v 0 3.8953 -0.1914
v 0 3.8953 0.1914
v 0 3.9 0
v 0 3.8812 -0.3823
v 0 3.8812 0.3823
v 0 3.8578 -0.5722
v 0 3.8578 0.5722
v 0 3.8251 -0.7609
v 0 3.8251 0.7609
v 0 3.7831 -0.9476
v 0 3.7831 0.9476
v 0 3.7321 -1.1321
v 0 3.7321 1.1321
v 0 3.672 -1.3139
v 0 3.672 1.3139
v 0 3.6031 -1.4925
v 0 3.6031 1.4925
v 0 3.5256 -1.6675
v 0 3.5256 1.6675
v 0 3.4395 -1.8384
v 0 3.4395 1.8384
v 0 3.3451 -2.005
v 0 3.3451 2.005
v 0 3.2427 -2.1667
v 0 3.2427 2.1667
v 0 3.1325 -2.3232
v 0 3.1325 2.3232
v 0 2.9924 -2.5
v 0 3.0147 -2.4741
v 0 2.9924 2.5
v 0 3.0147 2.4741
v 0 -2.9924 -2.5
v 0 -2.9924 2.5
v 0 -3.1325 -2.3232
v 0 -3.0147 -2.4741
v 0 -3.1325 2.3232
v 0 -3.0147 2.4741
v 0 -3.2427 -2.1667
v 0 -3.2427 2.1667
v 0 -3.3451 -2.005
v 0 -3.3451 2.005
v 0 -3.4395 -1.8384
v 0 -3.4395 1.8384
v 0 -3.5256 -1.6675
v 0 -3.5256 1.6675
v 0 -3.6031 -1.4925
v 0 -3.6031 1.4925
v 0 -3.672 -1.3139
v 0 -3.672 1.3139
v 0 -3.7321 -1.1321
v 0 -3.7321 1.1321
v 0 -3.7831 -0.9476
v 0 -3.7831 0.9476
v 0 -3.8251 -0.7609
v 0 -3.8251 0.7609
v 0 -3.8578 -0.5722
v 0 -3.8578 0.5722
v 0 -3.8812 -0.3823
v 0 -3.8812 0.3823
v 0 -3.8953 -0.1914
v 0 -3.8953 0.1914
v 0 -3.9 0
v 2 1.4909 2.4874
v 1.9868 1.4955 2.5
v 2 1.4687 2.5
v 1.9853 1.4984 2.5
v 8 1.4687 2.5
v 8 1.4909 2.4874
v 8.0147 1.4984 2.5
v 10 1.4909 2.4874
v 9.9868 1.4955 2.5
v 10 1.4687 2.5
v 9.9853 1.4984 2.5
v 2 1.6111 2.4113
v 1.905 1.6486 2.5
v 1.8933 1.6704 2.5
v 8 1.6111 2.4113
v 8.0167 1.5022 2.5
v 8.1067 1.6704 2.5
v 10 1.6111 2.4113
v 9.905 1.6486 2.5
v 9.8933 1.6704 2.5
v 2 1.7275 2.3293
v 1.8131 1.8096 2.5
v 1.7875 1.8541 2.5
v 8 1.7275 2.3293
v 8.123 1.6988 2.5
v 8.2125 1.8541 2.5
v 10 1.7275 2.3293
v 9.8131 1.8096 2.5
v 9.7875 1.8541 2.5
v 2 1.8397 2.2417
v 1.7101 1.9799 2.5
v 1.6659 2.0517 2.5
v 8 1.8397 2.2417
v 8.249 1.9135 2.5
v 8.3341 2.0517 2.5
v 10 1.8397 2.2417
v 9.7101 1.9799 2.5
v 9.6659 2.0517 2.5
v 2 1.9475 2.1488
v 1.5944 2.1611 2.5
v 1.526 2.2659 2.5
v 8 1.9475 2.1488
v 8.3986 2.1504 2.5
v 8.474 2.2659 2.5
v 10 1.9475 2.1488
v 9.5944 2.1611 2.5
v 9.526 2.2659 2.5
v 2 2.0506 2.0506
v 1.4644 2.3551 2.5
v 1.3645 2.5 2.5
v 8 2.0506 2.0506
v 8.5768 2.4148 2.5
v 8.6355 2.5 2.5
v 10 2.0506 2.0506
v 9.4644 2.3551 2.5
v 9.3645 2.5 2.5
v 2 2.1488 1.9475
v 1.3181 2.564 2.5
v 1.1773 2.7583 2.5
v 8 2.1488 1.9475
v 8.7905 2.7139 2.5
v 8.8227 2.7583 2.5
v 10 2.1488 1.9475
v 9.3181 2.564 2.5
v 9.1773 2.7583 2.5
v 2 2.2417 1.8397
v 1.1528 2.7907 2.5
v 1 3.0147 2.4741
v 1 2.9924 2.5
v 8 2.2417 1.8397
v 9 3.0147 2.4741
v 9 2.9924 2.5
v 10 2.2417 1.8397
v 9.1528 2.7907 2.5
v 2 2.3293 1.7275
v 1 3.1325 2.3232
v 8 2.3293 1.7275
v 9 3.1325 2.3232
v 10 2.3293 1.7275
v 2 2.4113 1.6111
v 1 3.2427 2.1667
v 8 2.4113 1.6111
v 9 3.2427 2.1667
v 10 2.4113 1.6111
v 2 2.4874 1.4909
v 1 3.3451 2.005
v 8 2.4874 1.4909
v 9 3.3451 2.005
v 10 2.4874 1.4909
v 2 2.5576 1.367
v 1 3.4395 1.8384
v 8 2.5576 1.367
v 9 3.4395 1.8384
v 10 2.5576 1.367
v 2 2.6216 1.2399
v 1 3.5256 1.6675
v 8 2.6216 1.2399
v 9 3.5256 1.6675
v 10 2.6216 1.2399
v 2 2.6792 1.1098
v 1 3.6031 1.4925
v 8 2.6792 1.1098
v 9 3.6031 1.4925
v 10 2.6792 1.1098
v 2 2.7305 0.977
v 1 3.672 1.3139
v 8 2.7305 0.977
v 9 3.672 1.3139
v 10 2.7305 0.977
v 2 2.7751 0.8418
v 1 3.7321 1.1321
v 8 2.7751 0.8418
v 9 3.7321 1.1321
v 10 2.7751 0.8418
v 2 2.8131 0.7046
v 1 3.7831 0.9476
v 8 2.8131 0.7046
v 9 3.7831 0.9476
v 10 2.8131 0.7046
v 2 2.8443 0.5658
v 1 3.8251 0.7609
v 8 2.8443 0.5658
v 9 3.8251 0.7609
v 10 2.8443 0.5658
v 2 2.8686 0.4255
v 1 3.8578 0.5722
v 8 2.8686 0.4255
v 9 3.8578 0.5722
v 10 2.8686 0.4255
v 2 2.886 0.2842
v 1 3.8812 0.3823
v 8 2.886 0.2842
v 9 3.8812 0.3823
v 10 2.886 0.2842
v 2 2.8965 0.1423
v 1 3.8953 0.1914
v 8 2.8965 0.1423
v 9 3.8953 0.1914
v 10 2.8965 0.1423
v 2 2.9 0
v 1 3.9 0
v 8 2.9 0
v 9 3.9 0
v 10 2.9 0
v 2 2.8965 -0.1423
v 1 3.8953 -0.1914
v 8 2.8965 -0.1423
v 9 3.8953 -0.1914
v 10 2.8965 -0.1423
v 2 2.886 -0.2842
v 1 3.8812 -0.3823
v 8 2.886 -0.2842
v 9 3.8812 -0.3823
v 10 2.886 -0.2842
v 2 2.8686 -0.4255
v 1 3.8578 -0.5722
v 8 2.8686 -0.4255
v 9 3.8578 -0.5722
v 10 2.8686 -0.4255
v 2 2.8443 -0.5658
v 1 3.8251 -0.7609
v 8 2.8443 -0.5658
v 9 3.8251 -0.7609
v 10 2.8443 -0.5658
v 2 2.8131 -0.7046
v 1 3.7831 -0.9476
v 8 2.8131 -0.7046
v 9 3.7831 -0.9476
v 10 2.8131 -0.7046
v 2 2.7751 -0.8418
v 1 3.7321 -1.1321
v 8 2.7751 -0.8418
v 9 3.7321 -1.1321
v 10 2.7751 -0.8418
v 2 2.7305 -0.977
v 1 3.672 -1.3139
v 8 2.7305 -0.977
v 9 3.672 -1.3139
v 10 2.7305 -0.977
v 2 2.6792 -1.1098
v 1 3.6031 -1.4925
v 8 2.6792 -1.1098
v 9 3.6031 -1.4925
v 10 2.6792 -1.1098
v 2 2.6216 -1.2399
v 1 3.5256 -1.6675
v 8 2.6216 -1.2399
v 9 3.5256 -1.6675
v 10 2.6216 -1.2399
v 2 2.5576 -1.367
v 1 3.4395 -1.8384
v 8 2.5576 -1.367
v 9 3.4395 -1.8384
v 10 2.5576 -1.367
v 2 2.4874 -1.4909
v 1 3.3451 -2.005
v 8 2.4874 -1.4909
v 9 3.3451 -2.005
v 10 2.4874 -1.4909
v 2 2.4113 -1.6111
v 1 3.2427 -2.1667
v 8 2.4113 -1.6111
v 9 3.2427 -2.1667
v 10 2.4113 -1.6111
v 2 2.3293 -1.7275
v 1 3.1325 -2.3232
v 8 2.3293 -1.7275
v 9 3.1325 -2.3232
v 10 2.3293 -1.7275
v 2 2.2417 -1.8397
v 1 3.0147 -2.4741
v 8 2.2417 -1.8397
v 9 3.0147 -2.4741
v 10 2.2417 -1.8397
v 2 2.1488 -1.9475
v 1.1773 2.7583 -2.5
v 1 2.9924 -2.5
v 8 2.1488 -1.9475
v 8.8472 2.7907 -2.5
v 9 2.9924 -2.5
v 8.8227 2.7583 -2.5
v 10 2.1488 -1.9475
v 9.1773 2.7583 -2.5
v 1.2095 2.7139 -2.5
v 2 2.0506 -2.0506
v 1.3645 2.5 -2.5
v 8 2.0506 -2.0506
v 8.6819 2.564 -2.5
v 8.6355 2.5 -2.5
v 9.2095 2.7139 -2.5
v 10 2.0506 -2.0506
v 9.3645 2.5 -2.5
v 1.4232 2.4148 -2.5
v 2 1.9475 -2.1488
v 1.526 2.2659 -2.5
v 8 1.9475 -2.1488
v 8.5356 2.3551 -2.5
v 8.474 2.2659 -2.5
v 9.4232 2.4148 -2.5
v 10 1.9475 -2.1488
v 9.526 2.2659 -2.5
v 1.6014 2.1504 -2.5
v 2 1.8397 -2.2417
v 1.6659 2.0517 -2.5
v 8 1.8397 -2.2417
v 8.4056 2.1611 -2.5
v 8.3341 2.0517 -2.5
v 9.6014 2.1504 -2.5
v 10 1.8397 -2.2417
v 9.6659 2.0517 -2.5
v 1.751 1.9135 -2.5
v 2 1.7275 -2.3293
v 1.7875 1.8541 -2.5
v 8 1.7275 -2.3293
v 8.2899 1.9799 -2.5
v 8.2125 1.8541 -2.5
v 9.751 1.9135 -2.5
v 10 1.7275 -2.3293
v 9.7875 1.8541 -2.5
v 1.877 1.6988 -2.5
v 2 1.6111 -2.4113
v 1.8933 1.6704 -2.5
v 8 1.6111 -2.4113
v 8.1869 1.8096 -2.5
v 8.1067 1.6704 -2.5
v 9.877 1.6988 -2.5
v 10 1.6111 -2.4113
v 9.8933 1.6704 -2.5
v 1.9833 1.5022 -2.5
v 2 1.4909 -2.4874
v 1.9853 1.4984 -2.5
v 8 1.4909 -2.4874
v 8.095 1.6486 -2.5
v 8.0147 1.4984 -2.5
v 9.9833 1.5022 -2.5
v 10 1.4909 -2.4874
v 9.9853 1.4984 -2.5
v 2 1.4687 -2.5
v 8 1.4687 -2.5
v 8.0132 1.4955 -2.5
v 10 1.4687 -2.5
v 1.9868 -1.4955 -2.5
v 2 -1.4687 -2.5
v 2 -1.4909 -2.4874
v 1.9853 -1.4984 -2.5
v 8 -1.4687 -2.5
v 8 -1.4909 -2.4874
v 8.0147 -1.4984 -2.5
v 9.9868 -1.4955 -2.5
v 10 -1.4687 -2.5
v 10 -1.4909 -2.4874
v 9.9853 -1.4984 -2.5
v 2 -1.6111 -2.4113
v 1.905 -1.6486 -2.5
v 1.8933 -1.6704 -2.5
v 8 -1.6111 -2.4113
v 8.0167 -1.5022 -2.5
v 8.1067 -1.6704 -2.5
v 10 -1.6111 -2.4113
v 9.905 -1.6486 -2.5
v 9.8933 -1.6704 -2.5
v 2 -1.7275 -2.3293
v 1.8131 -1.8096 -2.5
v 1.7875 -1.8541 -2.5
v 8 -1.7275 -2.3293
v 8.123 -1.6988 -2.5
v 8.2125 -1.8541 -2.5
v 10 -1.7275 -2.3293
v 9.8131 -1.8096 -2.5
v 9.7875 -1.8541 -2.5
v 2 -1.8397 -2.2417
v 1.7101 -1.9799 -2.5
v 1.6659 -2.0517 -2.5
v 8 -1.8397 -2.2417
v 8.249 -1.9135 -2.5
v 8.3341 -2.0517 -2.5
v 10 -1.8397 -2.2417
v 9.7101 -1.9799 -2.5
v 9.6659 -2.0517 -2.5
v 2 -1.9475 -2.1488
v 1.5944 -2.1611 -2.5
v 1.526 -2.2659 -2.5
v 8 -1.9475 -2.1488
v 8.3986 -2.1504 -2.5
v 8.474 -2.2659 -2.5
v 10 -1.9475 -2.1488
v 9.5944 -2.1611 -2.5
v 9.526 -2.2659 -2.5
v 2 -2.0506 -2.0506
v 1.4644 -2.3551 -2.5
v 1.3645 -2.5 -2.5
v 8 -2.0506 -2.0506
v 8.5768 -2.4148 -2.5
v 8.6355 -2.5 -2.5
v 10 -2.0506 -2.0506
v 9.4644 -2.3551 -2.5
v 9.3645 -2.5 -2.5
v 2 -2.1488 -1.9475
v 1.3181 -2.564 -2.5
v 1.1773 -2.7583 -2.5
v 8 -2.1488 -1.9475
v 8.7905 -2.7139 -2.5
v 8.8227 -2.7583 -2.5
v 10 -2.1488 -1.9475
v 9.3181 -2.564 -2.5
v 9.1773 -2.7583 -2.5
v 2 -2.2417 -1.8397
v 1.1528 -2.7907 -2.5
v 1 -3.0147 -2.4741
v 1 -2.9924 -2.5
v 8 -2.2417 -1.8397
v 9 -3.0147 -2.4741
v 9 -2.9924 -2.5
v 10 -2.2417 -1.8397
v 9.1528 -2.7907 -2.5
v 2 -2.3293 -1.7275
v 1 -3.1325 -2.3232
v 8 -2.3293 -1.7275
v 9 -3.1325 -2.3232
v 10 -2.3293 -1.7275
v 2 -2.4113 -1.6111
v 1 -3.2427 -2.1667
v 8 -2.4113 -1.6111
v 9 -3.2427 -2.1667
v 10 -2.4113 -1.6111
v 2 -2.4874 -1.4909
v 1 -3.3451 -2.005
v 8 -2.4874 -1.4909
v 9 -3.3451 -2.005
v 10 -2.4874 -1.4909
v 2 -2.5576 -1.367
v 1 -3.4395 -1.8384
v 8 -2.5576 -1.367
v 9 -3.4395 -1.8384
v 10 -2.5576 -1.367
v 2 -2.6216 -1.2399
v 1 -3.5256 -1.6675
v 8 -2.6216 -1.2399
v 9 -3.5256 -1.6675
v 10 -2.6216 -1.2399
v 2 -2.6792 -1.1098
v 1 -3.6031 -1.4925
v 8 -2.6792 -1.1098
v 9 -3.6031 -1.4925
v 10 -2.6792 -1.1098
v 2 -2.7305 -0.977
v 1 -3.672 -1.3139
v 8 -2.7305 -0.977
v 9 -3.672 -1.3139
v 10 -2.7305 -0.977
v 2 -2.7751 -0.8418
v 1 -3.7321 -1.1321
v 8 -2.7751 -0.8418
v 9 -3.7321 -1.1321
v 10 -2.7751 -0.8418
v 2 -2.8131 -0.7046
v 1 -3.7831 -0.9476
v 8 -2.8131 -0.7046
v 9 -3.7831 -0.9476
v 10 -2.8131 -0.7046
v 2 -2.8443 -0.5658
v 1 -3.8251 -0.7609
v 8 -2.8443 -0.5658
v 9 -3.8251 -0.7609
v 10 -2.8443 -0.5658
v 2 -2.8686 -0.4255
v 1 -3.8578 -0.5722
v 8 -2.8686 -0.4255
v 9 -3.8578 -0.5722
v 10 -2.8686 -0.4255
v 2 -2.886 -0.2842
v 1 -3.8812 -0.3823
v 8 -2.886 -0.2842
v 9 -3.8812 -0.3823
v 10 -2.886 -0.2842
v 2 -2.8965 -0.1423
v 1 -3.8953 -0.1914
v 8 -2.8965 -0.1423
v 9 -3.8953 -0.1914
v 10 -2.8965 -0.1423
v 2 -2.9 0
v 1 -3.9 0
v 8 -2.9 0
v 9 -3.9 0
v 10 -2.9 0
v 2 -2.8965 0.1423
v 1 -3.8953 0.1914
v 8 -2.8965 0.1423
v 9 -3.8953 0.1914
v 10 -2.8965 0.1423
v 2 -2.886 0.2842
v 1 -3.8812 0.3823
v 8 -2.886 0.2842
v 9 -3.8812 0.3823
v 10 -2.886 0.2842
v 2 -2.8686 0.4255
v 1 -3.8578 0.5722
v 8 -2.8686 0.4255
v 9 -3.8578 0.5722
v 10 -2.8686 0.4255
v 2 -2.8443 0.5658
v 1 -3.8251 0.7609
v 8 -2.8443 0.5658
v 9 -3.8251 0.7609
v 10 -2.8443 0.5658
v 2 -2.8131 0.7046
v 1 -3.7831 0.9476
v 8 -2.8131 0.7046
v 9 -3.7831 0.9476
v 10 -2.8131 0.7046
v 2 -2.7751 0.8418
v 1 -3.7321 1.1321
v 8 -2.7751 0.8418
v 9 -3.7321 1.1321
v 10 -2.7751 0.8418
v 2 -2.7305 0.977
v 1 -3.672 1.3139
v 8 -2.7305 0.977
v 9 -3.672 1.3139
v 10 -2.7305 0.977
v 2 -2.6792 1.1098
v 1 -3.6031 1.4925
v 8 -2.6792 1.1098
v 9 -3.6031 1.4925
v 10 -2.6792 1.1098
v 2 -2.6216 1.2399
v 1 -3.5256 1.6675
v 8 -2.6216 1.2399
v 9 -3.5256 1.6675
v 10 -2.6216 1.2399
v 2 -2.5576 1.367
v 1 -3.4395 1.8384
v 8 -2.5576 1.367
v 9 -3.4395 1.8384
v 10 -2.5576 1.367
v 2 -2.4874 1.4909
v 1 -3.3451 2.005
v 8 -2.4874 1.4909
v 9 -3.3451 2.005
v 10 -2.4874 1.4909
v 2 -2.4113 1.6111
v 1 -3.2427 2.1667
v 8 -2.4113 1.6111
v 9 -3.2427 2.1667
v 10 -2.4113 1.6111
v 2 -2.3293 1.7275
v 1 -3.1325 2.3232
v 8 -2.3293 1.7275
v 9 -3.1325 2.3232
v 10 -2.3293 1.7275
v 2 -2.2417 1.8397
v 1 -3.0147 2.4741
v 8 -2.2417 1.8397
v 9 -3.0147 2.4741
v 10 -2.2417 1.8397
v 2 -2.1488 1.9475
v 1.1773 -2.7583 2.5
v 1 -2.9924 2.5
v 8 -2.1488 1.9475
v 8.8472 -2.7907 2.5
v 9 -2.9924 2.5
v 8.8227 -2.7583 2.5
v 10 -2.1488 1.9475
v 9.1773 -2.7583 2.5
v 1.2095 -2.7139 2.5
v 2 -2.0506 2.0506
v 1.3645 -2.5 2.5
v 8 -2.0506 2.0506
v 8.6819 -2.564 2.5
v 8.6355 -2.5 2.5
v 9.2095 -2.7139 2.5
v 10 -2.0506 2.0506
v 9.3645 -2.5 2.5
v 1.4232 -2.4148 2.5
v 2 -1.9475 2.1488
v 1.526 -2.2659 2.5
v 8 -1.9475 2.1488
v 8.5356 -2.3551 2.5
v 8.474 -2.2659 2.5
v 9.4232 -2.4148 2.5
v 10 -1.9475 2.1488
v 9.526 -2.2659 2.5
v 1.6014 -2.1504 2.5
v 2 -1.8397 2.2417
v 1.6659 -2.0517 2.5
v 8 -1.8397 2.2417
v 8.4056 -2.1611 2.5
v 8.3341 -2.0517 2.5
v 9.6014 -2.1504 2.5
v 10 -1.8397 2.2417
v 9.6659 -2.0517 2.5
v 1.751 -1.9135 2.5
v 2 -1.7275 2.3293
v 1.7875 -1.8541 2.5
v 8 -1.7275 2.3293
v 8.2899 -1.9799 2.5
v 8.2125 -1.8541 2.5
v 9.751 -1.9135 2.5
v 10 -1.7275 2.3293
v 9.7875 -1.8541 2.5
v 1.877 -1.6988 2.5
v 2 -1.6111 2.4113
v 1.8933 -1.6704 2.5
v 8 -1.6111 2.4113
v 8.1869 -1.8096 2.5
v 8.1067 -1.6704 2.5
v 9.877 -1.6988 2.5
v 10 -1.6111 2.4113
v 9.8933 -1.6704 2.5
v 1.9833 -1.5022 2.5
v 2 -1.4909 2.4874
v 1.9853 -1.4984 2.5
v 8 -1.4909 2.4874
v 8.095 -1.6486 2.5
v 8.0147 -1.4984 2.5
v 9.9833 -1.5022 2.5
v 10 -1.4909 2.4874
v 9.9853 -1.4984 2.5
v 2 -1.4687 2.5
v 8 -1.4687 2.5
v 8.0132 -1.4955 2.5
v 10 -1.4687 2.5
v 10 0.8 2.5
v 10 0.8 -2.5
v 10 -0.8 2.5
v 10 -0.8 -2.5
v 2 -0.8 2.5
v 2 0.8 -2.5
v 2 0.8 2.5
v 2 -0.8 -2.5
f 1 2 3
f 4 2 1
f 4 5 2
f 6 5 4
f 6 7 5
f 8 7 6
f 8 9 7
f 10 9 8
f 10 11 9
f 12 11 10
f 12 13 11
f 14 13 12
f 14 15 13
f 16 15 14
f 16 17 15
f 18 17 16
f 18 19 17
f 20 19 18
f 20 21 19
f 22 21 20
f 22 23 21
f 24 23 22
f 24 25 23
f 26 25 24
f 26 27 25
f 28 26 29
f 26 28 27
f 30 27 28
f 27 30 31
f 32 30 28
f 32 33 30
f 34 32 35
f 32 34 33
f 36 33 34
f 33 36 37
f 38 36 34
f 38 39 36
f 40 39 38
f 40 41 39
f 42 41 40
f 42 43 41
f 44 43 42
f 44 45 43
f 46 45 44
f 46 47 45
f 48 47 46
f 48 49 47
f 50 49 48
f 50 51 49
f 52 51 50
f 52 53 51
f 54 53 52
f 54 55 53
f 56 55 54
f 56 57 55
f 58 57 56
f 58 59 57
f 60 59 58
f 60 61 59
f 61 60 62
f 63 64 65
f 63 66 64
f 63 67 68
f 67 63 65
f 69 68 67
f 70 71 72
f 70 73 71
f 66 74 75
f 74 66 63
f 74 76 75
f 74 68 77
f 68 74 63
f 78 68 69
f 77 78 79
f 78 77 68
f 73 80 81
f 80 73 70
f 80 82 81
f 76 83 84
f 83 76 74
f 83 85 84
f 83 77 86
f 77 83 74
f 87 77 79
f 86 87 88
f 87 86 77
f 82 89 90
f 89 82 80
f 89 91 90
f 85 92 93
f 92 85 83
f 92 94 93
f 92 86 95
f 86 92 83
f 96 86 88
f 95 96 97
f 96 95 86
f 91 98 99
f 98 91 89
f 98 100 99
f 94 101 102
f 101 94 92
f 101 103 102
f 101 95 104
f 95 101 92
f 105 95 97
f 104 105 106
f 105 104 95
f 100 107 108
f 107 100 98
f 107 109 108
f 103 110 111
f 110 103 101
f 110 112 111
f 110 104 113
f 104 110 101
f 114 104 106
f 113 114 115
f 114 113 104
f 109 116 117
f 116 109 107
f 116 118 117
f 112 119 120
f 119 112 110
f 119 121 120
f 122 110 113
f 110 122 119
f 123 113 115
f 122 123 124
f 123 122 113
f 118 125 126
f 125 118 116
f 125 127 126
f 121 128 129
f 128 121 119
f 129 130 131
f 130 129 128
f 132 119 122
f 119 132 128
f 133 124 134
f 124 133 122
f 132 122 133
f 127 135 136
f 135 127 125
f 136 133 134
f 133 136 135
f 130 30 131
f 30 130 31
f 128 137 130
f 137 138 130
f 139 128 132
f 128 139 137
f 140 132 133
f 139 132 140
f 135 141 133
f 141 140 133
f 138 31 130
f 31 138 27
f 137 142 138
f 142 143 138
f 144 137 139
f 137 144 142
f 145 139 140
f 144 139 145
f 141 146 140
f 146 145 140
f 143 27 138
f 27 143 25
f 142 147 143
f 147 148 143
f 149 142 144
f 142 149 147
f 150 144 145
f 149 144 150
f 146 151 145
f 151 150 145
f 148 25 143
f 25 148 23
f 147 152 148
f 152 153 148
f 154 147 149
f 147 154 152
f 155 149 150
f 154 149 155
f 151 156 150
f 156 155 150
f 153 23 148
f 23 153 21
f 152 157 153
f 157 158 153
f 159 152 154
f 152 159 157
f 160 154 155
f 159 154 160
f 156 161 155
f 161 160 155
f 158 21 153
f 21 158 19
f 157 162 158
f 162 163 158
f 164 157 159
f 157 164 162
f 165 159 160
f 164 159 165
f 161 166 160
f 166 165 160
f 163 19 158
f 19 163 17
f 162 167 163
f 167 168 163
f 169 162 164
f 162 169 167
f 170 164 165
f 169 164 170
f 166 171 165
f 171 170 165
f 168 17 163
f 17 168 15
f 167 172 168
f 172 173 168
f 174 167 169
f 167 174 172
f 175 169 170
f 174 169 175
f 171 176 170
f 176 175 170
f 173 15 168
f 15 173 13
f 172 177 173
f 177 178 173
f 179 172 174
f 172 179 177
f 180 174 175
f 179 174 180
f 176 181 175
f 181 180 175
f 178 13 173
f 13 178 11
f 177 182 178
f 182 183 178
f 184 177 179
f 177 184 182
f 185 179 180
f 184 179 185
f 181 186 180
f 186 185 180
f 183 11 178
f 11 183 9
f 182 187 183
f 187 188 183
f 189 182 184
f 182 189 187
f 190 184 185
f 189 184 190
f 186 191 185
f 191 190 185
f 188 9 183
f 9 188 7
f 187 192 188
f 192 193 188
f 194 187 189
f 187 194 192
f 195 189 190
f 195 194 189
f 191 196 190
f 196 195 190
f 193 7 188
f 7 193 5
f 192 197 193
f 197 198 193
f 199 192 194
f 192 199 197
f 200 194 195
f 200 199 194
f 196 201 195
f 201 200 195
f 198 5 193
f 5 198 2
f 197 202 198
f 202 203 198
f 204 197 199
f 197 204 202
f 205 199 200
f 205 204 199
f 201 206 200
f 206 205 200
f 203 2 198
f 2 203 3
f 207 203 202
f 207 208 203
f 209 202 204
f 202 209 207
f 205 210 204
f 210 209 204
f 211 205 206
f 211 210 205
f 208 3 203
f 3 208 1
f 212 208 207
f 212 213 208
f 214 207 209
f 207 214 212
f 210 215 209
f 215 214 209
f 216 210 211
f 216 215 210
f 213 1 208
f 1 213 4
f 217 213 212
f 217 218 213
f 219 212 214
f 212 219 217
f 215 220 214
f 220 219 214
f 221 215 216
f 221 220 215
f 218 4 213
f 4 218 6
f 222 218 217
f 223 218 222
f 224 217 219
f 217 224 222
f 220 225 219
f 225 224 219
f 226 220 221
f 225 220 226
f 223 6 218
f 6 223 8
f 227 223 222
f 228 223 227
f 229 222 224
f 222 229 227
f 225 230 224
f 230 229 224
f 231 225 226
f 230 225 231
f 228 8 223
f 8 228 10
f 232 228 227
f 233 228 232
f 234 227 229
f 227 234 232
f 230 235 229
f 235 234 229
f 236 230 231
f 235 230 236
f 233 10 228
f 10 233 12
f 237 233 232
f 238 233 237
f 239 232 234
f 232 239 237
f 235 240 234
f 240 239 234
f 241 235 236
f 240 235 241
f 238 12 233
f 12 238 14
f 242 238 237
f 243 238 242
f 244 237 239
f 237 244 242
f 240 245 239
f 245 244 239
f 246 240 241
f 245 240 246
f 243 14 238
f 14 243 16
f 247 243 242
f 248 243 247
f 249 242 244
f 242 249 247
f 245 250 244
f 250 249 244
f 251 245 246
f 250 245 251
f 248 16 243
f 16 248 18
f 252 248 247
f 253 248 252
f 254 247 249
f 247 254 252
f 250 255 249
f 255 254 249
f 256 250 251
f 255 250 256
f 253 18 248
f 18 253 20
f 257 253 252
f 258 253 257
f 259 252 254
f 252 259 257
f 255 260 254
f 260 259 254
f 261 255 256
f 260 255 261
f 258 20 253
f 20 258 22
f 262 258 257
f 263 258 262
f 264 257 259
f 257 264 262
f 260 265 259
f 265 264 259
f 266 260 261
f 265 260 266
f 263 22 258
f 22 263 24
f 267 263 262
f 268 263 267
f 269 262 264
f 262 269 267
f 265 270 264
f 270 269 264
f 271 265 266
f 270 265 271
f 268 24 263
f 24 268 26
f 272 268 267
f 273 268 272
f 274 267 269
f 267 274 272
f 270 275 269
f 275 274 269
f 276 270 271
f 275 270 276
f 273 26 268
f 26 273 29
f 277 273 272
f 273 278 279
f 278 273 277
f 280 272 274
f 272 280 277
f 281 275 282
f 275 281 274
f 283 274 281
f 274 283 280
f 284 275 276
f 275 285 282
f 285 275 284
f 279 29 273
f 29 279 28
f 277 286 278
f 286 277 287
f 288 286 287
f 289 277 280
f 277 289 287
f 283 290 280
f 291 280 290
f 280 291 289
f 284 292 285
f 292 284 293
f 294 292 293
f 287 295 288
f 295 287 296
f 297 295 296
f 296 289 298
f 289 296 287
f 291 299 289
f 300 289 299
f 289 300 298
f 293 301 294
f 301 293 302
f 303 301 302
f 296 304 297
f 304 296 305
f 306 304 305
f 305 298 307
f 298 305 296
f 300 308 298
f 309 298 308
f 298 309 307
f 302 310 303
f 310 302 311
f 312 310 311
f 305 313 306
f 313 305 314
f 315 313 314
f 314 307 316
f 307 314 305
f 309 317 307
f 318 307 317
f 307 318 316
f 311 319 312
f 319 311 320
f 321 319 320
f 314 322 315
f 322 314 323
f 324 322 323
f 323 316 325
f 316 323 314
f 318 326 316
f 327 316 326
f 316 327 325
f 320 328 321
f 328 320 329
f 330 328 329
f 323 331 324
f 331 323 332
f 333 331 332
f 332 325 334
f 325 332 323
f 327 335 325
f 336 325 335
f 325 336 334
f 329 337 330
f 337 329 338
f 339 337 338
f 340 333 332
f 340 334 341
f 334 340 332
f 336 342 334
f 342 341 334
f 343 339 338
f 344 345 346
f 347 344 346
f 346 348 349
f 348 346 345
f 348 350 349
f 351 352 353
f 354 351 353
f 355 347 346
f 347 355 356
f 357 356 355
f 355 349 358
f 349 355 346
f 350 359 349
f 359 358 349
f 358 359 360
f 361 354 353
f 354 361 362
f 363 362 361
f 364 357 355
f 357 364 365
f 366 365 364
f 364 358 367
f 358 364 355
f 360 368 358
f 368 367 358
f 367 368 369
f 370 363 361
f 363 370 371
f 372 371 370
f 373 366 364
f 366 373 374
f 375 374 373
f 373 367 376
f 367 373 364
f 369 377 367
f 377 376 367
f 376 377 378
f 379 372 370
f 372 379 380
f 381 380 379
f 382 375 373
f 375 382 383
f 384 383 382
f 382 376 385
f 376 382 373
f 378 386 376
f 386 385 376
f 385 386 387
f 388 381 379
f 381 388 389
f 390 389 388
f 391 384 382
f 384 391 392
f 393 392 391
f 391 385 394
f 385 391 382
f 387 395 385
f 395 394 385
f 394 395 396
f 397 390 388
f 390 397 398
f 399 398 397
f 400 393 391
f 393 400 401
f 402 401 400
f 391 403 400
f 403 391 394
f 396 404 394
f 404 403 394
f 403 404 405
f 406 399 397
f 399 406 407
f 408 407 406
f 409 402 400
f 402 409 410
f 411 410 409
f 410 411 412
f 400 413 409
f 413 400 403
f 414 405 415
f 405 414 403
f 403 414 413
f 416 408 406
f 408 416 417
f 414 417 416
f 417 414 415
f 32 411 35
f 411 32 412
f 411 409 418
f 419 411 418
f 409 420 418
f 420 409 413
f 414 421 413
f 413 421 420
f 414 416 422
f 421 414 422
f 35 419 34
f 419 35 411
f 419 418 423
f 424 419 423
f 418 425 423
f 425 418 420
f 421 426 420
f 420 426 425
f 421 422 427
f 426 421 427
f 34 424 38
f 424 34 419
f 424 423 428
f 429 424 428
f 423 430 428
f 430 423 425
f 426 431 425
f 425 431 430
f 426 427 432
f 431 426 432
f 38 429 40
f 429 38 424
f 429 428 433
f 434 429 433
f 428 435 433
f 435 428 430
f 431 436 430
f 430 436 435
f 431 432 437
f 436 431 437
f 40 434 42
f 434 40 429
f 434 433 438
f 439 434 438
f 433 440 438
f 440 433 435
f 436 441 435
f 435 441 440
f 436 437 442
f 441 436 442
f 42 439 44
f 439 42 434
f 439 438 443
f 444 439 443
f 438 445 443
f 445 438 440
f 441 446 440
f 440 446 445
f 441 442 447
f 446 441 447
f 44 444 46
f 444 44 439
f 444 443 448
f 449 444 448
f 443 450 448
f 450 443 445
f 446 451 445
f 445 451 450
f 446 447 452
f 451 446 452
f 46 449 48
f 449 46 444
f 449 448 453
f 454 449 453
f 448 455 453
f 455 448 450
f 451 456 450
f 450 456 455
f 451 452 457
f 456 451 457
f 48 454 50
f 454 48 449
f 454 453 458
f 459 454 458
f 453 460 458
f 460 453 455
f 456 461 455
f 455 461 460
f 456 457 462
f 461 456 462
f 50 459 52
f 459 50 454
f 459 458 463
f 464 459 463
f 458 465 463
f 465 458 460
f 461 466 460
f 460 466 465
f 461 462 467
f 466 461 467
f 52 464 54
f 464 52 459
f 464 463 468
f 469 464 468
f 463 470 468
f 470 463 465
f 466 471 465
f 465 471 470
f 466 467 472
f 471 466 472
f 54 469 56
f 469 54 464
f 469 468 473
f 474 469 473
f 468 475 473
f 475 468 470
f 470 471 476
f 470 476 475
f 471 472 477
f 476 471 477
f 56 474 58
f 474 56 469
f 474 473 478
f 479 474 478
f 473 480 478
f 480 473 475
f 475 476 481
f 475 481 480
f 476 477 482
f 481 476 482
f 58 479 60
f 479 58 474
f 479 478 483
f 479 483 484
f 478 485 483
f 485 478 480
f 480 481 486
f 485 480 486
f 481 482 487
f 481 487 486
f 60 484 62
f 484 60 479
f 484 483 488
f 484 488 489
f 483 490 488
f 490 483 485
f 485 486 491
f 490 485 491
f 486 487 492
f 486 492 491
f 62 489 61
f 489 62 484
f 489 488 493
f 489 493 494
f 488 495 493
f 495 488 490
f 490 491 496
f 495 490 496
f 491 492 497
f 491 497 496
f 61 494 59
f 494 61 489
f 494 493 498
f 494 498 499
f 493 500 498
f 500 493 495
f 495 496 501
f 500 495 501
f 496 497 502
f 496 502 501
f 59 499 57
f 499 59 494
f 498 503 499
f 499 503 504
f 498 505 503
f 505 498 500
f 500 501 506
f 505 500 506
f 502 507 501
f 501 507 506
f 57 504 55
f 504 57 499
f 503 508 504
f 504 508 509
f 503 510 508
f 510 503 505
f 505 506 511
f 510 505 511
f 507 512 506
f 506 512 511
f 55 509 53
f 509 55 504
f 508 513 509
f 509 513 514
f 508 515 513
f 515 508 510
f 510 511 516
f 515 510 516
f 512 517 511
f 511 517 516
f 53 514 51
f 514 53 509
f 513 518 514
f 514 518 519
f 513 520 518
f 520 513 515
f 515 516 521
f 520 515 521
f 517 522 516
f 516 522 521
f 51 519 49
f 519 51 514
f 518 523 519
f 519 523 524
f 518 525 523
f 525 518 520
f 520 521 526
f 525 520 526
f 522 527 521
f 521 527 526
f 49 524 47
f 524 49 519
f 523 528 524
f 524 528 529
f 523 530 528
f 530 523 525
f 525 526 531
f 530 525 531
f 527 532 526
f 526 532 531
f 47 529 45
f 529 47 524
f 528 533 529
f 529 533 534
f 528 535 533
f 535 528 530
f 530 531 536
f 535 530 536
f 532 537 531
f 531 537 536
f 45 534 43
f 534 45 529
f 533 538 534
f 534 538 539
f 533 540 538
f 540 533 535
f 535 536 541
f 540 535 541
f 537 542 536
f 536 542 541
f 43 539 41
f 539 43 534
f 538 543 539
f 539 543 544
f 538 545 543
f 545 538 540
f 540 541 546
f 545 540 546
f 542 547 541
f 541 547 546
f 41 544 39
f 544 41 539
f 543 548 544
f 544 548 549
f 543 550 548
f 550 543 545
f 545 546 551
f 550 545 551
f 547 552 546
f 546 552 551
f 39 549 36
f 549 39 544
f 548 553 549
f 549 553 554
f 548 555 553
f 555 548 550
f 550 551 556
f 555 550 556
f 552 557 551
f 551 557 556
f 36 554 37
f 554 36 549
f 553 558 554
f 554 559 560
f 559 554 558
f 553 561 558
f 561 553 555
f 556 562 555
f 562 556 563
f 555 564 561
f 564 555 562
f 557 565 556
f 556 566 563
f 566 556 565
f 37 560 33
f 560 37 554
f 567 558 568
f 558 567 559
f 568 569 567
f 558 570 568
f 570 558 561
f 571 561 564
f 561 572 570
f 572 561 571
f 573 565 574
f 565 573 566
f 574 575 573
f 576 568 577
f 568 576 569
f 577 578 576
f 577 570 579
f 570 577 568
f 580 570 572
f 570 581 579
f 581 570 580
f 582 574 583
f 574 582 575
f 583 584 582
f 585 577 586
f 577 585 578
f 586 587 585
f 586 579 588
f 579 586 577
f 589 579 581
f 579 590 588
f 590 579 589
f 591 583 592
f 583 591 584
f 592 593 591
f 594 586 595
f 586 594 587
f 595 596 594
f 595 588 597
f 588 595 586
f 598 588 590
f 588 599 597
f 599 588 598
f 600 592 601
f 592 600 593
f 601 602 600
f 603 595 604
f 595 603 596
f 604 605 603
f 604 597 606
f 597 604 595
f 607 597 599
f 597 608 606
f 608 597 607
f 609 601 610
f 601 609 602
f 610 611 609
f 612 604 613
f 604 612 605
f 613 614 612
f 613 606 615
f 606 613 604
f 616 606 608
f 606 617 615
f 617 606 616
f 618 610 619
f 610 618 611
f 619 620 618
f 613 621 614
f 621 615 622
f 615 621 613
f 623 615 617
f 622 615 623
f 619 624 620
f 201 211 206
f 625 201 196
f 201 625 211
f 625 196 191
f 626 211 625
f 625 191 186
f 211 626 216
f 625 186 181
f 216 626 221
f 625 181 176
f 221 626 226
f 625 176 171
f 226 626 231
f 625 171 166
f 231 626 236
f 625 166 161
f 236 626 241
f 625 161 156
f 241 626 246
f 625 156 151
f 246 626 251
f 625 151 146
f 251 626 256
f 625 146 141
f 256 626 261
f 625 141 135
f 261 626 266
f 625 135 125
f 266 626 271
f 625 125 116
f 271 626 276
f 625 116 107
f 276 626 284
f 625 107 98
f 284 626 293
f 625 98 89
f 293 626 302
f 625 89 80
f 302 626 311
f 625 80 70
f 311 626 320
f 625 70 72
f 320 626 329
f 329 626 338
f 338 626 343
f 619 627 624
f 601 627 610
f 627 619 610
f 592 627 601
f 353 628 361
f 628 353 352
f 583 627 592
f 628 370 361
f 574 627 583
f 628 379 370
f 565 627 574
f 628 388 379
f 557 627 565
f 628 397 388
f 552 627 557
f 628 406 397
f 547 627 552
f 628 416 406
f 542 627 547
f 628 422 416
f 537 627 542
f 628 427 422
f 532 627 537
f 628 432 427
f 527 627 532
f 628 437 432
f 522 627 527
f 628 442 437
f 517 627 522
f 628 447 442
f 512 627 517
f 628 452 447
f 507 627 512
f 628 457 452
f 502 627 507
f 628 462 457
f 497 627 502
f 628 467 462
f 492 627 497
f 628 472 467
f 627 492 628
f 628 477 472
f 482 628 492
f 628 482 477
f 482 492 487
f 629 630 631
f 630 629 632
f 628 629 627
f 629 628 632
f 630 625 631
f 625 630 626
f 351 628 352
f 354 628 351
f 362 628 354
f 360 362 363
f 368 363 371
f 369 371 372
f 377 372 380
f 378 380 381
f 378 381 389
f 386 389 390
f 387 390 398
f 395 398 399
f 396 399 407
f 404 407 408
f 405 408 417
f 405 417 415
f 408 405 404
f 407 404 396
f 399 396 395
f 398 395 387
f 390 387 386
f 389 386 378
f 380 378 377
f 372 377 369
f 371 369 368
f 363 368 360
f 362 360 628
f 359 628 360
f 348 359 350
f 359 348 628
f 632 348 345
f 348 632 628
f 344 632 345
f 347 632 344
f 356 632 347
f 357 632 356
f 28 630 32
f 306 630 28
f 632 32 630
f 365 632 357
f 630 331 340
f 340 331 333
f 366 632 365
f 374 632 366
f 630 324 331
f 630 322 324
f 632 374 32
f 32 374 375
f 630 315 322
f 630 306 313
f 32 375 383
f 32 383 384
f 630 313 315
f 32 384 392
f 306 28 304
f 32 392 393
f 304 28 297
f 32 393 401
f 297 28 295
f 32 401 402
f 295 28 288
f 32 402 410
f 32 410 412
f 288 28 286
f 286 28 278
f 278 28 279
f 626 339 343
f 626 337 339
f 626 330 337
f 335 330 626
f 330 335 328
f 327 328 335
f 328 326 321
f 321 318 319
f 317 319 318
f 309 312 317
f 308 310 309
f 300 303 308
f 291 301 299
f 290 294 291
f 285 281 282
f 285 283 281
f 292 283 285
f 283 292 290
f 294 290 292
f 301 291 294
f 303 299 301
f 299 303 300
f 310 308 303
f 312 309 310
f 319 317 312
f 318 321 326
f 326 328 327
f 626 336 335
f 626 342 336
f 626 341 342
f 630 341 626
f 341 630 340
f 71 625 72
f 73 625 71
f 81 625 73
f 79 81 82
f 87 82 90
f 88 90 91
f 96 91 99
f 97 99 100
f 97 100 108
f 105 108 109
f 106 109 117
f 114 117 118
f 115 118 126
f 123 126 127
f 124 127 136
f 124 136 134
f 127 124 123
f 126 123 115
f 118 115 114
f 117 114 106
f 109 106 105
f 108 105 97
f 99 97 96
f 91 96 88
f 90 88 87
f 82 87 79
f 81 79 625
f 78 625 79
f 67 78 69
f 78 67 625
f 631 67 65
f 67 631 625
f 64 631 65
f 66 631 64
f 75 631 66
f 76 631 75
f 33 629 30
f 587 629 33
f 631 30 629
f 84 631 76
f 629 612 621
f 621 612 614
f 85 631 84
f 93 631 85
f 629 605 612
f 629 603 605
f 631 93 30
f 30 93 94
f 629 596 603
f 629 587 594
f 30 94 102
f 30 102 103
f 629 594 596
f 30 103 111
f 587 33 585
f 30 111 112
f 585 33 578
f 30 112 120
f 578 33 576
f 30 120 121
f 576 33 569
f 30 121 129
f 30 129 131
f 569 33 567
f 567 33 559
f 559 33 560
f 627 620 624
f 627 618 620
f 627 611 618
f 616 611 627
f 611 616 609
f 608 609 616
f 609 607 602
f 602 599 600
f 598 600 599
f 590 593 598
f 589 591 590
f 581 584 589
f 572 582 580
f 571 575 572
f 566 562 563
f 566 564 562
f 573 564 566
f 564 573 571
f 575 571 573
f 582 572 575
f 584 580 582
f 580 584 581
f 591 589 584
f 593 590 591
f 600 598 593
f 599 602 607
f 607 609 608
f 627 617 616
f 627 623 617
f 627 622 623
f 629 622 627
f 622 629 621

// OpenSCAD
rotate([0.0, 90.0, 0.0])
{
    intersection()
    {
        difference()
        {
            rotate_extrude(angle = 360.0, $fn = 128)
            {
                M240();
            }
            translate([0.0, 0.0, 2.0])
            {
                linear_extrude(height = 10.0, twist = 0.0, scale = 1.0, slices = 1, center = false)
                {
                    scale([10.0, 1.6])
                    {
                        M196();
                    }
                }
            }
        }
        linear_extrude(height = 10.0, twist = 0.0, scale = 1.0, slices = 1, center = false)
        {
            scale([5.0, 10.0])
            {
                M196();
            }
        }
    }
}

module M240()
{
    polygon
    (
        points =
        [
            [0.0, 0.0], 
            [3.9, 0.0], 
            [3.9, 1.0], 
            [2.9, 2.0], 
            [2.9, 8.0], 
            [3.9, 9.0], 
            [2.9, 10.0], 
            [0.0, 10.0], 
            [0.0, 2.0]
        ],
        paths =
        [
            [0, 1, 2, 3, 4, 5, 6, 7, 8]
        ]
    );
}

module M196()
{
    polygon
    (
        points =
        [
            [-0.5, -0.5], 
            [0.5, -0.5], 
            [0.5, 0.5], 
            [-0.5, 0.5]
        ],
        paths =
        [
            [0, 1, 2, 3]
        ]
    );
}
